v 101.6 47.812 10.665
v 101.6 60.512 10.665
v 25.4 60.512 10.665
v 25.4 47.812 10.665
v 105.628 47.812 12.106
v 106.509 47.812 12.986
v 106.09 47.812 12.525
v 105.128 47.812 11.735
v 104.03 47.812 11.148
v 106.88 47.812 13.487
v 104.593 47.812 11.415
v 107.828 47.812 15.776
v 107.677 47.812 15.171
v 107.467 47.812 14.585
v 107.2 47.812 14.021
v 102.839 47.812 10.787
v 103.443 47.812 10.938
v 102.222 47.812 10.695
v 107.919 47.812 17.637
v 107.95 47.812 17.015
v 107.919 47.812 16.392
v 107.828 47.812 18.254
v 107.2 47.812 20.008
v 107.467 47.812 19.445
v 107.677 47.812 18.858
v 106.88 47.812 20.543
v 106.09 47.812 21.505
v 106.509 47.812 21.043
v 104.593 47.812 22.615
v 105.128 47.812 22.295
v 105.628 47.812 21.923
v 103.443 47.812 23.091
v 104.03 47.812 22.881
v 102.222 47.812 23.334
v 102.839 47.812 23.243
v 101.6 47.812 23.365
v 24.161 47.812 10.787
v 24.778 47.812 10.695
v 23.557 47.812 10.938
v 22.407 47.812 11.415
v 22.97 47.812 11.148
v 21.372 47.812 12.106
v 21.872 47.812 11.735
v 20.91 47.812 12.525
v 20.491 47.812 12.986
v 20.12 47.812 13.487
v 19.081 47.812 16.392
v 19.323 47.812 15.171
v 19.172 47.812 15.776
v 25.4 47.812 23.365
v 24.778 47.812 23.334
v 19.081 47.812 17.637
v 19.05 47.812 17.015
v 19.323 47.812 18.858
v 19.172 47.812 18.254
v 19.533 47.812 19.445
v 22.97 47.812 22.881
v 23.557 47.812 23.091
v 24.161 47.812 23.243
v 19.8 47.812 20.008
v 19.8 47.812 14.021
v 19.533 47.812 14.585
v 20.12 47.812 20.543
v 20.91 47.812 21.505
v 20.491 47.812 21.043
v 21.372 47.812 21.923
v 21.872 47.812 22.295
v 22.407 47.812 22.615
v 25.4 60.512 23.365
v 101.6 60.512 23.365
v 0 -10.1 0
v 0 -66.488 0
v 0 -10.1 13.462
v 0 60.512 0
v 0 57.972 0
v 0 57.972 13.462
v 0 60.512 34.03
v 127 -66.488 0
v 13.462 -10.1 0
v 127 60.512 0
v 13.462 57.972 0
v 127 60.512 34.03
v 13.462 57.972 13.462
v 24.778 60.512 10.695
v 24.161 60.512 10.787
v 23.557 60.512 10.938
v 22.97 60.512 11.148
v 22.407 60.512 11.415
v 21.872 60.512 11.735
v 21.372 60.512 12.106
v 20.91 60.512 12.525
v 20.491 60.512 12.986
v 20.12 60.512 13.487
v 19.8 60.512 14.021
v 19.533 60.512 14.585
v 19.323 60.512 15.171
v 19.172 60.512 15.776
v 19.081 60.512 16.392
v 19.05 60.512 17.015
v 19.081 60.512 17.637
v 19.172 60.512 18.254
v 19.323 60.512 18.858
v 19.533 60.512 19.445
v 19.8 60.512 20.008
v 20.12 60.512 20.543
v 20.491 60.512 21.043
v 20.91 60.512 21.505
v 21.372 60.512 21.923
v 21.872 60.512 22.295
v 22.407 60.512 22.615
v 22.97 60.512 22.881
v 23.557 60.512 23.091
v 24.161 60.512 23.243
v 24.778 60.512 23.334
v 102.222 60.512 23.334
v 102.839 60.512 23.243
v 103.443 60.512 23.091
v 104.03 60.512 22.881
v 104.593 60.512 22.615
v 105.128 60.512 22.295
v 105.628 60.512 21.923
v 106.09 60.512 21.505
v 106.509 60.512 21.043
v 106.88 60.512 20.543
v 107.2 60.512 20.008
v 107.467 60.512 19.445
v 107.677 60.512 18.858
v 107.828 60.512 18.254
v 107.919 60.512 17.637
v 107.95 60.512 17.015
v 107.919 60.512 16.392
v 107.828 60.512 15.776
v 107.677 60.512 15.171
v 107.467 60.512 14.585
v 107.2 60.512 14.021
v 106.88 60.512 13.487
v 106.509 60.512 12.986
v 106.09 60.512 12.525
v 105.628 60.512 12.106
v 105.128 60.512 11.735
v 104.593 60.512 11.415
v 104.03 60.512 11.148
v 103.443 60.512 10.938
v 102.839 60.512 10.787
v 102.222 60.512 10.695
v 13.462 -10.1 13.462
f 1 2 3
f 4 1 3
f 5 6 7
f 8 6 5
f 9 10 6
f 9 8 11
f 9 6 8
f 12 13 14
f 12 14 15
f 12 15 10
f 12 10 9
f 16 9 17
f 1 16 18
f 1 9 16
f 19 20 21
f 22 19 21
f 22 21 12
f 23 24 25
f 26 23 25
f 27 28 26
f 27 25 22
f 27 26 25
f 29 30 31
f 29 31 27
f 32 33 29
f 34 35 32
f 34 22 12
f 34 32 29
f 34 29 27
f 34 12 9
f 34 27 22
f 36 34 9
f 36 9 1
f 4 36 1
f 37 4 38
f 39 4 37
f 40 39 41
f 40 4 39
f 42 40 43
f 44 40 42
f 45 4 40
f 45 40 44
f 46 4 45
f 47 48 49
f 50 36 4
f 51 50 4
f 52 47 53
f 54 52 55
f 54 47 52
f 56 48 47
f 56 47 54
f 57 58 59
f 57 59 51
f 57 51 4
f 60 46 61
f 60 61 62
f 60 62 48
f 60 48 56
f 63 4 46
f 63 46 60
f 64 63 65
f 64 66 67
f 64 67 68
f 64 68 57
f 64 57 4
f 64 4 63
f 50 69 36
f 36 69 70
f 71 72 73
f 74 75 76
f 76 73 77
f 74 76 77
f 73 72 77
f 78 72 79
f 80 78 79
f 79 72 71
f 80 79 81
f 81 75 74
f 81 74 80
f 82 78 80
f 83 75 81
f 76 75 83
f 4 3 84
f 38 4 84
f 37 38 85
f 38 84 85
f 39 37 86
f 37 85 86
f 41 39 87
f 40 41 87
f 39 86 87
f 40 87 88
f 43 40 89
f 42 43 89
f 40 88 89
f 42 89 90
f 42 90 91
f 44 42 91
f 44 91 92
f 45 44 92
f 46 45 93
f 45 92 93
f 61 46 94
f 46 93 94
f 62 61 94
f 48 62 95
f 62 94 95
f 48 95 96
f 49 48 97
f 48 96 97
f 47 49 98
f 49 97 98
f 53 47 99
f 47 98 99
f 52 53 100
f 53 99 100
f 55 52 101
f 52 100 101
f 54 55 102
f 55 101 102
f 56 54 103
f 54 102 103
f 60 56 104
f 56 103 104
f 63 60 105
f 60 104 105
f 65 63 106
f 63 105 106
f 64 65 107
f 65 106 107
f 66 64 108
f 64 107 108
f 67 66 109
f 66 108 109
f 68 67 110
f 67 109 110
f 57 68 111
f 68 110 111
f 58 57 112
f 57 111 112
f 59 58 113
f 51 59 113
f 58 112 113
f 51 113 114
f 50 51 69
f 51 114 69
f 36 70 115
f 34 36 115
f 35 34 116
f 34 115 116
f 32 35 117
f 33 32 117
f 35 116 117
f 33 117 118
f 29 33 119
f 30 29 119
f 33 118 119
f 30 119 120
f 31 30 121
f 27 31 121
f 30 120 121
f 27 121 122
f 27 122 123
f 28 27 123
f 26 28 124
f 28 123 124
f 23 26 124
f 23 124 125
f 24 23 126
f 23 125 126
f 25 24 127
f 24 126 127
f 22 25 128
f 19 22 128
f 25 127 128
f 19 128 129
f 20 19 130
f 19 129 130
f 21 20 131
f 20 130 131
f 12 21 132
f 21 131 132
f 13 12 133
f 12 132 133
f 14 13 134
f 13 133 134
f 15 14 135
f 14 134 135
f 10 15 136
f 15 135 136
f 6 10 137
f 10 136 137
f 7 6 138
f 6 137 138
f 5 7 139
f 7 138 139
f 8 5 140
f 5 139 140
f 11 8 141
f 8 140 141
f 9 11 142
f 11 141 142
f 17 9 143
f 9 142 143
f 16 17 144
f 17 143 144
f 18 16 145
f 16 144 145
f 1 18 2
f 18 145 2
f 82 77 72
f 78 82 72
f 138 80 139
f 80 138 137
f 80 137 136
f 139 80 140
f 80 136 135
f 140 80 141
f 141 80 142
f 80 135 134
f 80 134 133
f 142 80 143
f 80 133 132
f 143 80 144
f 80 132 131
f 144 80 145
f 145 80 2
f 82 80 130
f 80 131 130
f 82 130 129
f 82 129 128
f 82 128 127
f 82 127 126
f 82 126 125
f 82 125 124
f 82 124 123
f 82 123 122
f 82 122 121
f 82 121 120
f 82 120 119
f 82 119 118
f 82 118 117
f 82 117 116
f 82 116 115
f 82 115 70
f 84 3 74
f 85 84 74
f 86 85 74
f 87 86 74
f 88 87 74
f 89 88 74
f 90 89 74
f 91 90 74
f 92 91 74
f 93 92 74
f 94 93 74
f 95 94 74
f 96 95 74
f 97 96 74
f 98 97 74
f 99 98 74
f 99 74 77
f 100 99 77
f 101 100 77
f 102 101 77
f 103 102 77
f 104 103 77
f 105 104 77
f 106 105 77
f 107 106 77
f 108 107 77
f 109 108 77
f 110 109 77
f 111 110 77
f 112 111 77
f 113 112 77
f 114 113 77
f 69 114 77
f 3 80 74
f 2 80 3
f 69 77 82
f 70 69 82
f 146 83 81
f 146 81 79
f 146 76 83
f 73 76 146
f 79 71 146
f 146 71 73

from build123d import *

# Parameters (mm, degrees)
F1_DEPTH = 127
F2_W     = 68.072
F2_H     = 13.462
F3_DEPTH = 13.462
F5_DEPTH = 12.7


with BuildPart() as f1:
    # F0 (on Right) → F1 (new body)
    with BuildSketch(Plane.YZ):
        Polygon((60.512159, 34.029547), (-66.487841, 0), (60.512159, 0), align=None)
    extrude(amount=F1_DEPTH)

    # F2 (on face) → F3 (cut)
    with BuildSketch(Plane(origin=(0, 0, 0), x_dir=(0, -1, 0), z_dir=(-1, 0, 0))):
        with Locations((-23.936159, 6.731)):
            Rectangle(F2_W, F2_H)
    extrude(amount=-F3_DEPTH, mode=Mode.SUBTRACT)

    # F4 (on face) → F5 (cut)
    with BuildSketch(Plane(origin=(0, 60.512159, 0), x_dir=(-1, 0, 0), z_dir=(0, 1, 0))):
        with BuildLine():
            ThreePointArc((-101.6, 23.364774), (-107.95, 17.014774), (-101.6, 10.664774))
            Line((-101.6, 10.664774), (-25.4, 10.664774))
            ThreePointArc((-25.4, 10.664774), (-19.05, 17.014774), (-25.4, 23.364774))
            Line((-25.4, 23.364774), (-101.6, 23.364774))
        make_face()
    extrude(amount=-F5_DEPTH, mode=Mode.SUBTRACT)


solid = f1.part
